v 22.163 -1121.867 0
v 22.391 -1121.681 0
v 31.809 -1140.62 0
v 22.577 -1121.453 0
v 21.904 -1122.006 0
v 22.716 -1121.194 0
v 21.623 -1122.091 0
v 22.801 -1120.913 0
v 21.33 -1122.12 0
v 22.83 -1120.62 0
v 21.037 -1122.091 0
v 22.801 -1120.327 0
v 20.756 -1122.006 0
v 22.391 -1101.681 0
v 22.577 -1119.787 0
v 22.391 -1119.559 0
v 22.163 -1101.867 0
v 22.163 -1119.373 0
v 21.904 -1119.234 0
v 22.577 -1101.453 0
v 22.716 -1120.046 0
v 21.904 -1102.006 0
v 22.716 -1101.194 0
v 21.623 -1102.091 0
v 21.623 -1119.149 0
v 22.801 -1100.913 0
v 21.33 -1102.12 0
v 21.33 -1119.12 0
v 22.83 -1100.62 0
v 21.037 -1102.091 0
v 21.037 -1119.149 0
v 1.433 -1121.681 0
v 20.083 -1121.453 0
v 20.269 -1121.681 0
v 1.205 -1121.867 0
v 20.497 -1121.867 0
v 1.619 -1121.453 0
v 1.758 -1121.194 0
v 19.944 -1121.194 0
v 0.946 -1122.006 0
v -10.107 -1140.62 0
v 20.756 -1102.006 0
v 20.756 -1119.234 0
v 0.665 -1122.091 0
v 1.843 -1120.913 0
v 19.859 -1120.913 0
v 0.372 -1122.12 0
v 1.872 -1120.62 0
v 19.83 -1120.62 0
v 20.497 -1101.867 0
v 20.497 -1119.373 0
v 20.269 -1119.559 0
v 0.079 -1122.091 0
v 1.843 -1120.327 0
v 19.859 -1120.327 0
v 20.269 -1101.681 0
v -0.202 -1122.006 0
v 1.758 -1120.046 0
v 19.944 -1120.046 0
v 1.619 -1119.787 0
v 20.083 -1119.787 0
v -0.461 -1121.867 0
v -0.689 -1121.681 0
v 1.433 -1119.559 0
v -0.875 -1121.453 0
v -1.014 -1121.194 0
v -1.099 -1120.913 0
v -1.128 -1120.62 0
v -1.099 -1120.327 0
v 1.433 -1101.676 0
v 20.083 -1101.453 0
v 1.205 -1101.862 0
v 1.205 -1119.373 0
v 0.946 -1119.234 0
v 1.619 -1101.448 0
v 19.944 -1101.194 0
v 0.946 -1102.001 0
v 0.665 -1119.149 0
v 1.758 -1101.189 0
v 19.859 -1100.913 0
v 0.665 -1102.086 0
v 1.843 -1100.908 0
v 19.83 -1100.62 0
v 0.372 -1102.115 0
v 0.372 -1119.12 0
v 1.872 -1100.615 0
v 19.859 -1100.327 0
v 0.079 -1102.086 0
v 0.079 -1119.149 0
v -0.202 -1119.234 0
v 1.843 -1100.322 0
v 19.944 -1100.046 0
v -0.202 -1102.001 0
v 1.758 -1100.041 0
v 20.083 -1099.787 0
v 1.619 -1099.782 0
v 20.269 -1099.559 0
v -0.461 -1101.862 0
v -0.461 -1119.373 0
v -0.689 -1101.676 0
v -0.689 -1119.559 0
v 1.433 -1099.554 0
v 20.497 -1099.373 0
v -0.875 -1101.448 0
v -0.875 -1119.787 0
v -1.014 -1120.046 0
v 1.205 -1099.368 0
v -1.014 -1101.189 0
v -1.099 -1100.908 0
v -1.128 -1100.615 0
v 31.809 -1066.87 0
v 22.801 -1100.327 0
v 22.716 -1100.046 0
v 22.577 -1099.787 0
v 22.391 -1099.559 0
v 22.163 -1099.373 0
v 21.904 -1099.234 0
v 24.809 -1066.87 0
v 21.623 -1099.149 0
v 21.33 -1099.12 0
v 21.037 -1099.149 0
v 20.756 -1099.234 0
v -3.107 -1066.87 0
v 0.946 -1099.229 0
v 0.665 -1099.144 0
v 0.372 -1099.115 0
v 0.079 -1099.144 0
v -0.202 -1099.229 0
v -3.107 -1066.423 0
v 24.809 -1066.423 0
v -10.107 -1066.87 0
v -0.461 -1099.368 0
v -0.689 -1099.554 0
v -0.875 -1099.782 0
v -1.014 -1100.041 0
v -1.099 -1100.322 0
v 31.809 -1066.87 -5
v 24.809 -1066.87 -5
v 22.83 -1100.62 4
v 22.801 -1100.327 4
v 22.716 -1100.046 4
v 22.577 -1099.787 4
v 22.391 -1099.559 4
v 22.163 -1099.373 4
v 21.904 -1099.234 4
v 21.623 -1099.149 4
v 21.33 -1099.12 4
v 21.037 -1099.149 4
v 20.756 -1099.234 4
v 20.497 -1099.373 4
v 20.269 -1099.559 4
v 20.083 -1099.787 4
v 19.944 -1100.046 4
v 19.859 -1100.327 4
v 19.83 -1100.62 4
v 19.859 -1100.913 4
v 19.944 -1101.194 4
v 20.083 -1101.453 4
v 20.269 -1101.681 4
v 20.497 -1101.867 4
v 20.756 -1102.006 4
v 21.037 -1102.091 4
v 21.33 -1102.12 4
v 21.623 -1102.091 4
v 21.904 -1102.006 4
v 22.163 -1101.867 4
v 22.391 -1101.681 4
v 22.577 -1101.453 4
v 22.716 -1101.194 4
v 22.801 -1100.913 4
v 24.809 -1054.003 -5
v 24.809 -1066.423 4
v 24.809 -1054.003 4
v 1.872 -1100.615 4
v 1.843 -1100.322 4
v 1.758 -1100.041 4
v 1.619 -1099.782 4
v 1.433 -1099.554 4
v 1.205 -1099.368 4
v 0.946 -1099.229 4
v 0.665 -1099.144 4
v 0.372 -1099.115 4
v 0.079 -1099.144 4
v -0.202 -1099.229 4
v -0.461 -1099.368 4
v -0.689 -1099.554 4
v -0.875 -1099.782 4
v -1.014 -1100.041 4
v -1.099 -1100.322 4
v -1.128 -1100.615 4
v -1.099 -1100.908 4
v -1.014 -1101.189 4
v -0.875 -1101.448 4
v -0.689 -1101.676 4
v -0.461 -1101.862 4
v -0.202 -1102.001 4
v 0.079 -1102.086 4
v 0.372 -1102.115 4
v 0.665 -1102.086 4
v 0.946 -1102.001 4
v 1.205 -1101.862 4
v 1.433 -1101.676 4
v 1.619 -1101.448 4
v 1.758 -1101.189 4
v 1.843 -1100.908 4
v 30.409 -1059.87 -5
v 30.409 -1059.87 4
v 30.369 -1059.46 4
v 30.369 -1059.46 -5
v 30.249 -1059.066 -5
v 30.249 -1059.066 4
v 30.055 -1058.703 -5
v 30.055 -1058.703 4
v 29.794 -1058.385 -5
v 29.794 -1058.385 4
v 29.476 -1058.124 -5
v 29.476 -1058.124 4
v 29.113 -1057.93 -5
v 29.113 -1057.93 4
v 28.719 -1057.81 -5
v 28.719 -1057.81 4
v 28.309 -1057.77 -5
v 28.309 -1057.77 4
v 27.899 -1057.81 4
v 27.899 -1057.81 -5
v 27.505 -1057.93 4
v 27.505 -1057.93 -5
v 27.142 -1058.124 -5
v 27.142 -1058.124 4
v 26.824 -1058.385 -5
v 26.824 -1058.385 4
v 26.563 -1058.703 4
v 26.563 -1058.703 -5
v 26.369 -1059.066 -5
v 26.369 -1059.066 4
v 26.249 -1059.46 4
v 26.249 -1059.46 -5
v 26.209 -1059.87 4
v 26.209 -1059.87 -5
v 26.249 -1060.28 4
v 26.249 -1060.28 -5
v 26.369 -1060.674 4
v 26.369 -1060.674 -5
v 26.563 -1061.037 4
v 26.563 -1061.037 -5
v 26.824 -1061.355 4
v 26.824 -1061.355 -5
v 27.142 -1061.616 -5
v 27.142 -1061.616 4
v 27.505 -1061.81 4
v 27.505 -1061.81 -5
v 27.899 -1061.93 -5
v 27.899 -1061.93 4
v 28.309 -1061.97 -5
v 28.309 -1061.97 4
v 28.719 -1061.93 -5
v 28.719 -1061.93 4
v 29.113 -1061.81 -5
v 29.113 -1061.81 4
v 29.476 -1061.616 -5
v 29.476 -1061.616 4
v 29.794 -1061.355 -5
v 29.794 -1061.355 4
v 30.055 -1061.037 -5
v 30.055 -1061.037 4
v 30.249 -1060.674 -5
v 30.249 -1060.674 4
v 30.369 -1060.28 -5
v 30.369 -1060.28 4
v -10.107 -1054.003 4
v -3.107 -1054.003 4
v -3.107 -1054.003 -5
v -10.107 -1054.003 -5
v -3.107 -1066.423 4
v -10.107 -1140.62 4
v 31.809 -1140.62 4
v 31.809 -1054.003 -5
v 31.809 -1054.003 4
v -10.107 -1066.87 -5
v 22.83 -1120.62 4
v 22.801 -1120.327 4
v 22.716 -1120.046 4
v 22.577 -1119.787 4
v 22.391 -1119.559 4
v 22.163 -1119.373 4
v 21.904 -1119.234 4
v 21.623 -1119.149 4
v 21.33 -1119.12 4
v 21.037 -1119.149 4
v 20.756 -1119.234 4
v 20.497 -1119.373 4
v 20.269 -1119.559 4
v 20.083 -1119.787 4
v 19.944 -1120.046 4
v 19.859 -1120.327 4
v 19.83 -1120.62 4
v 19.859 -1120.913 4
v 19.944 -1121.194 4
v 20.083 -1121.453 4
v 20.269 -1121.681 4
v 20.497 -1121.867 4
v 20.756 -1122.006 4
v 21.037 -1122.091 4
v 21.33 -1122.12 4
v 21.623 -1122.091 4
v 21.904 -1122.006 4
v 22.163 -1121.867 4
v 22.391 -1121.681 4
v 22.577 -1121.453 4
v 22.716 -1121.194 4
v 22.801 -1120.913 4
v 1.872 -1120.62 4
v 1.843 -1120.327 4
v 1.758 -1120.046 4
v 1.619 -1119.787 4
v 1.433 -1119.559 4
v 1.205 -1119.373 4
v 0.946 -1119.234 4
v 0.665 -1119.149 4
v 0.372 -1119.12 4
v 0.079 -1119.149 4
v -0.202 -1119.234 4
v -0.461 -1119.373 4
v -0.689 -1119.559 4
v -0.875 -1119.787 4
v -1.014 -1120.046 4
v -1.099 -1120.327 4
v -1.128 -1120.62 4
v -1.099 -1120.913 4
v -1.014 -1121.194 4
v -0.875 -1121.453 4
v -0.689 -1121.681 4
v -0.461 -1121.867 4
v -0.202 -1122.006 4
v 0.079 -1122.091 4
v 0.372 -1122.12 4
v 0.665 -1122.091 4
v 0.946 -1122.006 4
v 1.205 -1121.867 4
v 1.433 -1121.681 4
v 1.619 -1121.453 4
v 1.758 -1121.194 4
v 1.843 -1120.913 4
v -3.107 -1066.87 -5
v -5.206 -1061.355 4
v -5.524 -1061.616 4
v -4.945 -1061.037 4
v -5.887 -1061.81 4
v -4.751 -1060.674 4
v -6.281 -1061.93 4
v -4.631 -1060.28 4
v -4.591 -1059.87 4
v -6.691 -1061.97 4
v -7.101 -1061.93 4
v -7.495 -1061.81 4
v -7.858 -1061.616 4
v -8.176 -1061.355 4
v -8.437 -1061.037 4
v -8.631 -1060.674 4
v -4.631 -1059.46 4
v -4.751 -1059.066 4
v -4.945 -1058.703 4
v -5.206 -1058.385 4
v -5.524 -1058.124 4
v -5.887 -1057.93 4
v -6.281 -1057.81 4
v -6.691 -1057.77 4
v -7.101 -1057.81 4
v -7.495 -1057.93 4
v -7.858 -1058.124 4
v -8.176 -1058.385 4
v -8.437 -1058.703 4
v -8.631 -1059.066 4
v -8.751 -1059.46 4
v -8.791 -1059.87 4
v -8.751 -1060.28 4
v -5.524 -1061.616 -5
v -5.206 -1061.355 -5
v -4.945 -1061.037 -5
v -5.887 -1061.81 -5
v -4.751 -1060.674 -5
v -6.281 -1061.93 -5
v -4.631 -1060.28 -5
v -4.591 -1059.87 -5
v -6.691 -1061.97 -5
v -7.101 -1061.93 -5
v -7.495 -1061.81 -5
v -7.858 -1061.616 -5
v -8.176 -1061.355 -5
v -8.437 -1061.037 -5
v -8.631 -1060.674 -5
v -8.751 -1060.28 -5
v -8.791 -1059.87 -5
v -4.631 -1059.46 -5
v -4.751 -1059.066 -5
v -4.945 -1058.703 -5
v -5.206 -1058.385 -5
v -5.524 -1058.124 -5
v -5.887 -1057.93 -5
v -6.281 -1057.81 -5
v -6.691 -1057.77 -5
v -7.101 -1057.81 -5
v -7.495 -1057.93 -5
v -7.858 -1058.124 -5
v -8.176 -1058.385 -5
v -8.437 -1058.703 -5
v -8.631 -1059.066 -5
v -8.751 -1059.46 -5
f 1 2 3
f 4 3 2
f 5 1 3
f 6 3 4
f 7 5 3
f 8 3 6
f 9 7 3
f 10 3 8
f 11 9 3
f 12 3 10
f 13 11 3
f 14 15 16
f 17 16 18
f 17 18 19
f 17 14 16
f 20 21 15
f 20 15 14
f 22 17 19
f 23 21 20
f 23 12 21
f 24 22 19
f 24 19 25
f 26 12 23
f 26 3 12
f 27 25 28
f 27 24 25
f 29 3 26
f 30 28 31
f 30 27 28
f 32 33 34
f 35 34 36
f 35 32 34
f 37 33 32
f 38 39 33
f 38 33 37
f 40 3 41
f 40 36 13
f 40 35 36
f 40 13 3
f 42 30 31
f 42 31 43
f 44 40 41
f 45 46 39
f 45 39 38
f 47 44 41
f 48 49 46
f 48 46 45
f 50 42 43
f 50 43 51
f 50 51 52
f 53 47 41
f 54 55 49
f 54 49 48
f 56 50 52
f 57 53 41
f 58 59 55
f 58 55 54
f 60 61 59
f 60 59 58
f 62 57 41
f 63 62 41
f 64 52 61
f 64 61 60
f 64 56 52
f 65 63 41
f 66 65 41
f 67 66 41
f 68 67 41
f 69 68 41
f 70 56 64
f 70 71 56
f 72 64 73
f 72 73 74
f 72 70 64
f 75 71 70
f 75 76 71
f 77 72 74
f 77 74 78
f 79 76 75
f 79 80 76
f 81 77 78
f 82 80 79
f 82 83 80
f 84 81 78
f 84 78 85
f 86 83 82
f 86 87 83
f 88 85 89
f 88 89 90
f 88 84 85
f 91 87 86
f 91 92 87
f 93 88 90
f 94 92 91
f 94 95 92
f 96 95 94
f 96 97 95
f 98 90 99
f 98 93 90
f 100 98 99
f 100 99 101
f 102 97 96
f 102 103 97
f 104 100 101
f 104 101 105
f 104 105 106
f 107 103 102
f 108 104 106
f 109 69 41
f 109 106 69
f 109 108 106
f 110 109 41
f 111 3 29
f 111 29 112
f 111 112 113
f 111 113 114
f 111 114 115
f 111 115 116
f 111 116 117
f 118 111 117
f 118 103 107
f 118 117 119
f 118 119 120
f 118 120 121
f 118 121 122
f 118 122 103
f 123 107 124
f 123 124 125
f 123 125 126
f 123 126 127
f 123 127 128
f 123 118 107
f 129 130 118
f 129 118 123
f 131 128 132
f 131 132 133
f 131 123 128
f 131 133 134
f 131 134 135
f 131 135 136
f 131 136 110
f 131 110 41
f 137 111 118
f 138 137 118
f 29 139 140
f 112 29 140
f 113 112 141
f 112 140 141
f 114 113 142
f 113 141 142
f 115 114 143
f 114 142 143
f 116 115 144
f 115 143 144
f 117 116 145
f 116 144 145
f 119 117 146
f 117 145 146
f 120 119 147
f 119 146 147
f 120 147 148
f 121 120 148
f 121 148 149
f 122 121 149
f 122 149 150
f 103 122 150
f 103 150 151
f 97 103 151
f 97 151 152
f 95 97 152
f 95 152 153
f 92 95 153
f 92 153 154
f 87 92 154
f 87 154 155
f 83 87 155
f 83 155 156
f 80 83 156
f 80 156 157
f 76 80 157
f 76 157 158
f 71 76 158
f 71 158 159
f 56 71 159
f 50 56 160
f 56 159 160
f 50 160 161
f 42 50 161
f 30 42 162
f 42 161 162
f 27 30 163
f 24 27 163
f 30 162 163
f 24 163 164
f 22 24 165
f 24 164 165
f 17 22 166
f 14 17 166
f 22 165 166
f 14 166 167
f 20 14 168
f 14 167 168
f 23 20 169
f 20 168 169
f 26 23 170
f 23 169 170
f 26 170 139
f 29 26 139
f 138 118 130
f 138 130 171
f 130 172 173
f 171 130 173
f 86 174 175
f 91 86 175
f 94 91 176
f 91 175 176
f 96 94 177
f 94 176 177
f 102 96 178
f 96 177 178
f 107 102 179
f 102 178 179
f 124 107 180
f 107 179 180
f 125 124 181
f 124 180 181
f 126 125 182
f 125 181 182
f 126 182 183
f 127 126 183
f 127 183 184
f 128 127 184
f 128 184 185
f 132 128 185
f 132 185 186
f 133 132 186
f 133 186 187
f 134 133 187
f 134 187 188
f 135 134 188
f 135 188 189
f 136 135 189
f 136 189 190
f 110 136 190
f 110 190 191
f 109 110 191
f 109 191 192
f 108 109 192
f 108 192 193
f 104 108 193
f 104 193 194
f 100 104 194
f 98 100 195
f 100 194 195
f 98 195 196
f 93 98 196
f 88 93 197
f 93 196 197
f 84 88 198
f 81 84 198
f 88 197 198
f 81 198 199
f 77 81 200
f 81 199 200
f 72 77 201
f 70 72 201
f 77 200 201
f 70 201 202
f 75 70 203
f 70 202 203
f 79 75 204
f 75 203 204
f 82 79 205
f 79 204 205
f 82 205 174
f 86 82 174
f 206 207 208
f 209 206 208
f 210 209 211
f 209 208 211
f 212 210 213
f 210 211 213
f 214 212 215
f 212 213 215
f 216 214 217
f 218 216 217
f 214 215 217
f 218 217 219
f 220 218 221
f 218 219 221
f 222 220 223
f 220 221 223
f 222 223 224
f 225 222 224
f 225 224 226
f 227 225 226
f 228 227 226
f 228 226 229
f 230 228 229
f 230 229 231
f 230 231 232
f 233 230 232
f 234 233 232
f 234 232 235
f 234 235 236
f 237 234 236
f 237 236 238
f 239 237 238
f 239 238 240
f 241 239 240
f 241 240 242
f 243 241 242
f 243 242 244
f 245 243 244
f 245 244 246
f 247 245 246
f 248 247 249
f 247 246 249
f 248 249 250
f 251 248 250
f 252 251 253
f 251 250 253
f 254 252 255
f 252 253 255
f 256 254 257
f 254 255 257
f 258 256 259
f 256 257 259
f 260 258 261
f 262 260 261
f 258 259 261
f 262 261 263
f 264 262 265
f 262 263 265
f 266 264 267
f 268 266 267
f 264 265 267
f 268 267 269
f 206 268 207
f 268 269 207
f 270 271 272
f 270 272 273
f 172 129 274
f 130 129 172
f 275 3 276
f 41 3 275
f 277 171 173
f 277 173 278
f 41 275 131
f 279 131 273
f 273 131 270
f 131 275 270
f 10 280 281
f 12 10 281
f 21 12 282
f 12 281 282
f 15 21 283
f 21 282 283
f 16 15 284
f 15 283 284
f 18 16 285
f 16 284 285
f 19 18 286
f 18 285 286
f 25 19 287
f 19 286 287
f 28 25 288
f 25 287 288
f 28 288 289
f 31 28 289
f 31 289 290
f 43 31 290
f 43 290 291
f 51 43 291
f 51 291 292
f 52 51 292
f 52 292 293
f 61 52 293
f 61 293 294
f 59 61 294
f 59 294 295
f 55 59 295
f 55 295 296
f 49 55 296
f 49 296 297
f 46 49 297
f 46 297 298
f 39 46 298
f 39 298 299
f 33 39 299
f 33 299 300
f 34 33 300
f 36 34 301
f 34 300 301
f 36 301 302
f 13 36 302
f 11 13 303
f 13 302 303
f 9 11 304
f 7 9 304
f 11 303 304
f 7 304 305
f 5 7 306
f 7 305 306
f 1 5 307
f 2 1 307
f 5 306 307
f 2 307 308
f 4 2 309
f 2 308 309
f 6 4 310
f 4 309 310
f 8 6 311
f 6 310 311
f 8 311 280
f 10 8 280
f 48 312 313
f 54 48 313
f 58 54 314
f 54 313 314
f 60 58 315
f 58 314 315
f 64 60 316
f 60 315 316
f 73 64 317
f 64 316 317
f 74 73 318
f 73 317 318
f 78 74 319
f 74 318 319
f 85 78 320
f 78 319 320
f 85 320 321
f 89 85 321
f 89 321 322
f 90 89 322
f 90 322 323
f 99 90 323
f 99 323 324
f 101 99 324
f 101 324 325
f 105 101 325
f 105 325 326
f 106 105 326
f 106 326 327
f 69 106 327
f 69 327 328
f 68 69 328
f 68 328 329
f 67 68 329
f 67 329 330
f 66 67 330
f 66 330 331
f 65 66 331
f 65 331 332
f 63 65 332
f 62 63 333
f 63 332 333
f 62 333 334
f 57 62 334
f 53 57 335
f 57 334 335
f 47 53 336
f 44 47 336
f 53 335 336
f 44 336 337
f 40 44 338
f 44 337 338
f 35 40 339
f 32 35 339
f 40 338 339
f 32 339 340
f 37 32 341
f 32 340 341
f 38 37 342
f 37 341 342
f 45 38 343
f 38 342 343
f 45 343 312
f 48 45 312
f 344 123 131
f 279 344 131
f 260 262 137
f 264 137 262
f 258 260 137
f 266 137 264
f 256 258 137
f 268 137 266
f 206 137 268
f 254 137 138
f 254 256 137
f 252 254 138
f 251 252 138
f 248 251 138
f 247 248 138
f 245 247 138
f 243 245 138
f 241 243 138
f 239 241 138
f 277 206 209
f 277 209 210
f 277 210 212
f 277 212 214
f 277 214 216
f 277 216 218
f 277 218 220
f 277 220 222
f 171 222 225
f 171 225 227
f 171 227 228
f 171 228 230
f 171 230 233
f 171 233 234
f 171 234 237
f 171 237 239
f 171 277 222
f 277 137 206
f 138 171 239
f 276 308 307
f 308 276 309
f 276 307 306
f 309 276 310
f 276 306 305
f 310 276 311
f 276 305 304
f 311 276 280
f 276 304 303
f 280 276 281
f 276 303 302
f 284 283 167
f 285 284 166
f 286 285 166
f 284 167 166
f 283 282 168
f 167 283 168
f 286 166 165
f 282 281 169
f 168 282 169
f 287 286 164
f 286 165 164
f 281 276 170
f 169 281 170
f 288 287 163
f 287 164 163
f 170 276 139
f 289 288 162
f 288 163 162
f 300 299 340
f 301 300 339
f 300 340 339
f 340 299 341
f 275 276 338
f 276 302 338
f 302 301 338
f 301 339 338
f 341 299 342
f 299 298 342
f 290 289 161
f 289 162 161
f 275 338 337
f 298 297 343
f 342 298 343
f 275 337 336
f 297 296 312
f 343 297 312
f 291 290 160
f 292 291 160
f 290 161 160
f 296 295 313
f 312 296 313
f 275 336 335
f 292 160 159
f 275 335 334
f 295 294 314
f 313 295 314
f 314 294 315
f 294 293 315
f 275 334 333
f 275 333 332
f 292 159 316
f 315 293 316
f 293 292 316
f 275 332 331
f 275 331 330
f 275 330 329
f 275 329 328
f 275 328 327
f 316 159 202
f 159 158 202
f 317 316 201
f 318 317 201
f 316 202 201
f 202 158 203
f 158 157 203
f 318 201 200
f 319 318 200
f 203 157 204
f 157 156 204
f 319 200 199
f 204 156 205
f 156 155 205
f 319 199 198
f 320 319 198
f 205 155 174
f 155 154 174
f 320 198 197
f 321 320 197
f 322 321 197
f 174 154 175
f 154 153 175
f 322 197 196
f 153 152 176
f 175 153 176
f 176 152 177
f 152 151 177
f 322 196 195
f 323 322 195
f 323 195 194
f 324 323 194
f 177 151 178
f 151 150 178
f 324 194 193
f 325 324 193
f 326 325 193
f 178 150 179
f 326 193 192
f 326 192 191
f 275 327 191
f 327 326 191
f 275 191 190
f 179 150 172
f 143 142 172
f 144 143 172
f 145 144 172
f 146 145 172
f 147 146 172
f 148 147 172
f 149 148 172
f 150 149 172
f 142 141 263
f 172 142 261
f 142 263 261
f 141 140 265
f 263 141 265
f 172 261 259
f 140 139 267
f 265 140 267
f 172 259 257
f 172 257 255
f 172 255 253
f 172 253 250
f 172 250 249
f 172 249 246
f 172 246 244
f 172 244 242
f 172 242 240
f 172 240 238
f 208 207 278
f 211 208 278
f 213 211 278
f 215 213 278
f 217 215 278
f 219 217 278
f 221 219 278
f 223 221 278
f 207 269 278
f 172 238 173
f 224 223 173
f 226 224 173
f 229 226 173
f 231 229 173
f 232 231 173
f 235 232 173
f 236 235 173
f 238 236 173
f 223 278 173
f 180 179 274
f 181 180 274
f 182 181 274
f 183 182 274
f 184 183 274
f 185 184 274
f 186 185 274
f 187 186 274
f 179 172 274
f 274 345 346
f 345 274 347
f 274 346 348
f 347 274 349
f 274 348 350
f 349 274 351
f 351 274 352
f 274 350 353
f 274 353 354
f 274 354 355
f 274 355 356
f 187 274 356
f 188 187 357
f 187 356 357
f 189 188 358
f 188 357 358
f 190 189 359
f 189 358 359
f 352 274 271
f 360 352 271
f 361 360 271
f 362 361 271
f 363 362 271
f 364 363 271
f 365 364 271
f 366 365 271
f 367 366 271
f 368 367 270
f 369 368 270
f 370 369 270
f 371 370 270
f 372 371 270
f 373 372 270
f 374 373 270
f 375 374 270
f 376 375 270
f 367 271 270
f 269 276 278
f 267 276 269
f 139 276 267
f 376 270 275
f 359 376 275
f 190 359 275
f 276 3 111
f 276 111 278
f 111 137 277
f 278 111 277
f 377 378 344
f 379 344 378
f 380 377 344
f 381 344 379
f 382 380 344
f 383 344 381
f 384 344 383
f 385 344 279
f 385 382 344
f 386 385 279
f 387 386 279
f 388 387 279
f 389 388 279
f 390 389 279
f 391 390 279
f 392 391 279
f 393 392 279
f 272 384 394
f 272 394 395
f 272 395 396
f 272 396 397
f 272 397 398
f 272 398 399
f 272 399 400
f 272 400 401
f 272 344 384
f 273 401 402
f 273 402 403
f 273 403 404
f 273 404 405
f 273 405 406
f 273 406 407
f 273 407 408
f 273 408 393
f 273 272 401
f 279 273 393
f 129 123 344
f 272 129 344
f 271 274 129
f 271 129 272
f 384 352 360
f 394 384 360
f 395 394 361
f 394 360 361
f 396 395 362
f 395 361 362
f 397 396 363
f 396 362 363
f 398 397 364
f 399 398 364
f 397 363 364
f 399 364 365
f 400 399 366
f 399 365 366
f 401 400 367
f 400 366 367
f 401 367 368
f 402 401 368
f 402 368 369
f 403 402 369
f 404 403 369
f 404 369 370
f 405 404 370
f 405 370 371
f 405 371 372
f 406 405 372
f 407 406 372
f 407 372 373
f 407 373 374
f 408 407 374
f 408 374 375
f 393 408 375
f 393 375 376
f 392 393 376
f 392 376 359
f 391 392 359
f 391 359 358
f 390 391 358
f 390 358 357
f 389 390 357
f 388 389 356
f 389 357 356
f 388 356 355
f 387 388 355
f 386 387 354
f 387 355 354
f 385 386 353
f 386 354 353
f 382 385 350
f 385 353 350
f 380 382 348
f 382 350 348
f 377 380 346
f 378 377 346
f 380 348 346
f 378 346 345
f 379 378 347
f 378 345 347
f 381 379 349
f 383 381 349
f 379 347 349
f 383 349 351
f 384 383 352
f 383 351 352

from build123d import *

# Parameters (mm, degrees)
SALIENTE_EXTRUIR1_DEPTH = 4
CROQUIS2_W              = 7
CROQUIS2_H              = 12.866645138
SALIENTE_EXTRUIR2_DEPTH = 5
CROQUIS3_R              = 2.1
CORTAR_EXTRUIR1_DEPTH   = 10
CROQUIS4_R              = 1.5
CORTAR_EXTRUIR2_DEPTH   = 10
CROQUIS5_R              = 1.5
CORTAR_EXTRUIR3_DEPTH   = 10


with BuildPart() as part:
    # Croquis1 → Saliente-Extruir1 (new body)
    with BuildSketch(Plane.XY):
        Polygon((31.808893405, -1059.380585752), (31.808893405, -1140.619885182), (-10.106831803, -1140.619885182), (-10.106831803, -1059.380585752), (-10.106831803, -1054.003240044), (-3.106831803, -1054.003240044), (-3.106831803, -1066.423001802), (24.808893405, -1066.423001802), (24.808893405, -1054.003240044), (31.808893405, -1054.003240044), align=None)
    extrude(amount=SALIENTE_EXTRUIR1_DEPTH)

    # Croquis2 → Saliente-Extruir2 (add)
    with BuildSketch(Plane(origin=(0, 0, 0), x_dir=(-1, 0, 0), z_dir=(0, 0, -1))):
        with Locations((6.606831803, -1060.436562613)):
            Rectangle(CROQUIS2_W, CROQUIS2_H)
        with Locations((-28.308893405, -1060.436562613)):
            Rectangle(CROQUIS2_W, CROQUIS2_H)
    extrude(amount=SALIENTE_EXTRUIR2_DEPTH)

    # Croquis3 → Cortar-Extruir1 (cut)
    with BuildSketch(Plane.XY.offset(4)):
        with Locations((-6.691106595, -1059.869885182)):
            Circle(CROQUIS3_R)
        with Locations((28.308893405, -1059.869885182)):
            Circle(CROQUIS3_R)
    extrude(amount=-CORTAR_EXTRUIR1_DEPTH, mode=Mode.SUBTRACT)

    # Croquis4 → Cortar-Extruir2 (cut)
    with BuildSketch(Plane.XY.offset(4)):
        with Locations((21.329962103, -1120.619885182)):
            Circle(CROQUIS4_R)
        with Locations((0.372099499, -1120.619885182)):
            Circle(CROQUIS4_R)
    extrude(amount=-CORTAR_EXTRUIR2_DEPTH, mode=Mode.SUBTRACT)

    # Croquis5 → Cortar-Extruir3 (cut)
    with BuildSketch(Plane.XY.offset(4)):
        with Locations((0.372099499, -1100.615007654)):
            Circle(CROQUIS5_R)
        with Locations((21.329962103, -1100.619885182)):
            Circle(CROQUIS5_R)
    extrude(amount=-CORTAR_EXTRUIR3_DEPTH, mode=Mode.SUBTRACT)


solid = part.part
